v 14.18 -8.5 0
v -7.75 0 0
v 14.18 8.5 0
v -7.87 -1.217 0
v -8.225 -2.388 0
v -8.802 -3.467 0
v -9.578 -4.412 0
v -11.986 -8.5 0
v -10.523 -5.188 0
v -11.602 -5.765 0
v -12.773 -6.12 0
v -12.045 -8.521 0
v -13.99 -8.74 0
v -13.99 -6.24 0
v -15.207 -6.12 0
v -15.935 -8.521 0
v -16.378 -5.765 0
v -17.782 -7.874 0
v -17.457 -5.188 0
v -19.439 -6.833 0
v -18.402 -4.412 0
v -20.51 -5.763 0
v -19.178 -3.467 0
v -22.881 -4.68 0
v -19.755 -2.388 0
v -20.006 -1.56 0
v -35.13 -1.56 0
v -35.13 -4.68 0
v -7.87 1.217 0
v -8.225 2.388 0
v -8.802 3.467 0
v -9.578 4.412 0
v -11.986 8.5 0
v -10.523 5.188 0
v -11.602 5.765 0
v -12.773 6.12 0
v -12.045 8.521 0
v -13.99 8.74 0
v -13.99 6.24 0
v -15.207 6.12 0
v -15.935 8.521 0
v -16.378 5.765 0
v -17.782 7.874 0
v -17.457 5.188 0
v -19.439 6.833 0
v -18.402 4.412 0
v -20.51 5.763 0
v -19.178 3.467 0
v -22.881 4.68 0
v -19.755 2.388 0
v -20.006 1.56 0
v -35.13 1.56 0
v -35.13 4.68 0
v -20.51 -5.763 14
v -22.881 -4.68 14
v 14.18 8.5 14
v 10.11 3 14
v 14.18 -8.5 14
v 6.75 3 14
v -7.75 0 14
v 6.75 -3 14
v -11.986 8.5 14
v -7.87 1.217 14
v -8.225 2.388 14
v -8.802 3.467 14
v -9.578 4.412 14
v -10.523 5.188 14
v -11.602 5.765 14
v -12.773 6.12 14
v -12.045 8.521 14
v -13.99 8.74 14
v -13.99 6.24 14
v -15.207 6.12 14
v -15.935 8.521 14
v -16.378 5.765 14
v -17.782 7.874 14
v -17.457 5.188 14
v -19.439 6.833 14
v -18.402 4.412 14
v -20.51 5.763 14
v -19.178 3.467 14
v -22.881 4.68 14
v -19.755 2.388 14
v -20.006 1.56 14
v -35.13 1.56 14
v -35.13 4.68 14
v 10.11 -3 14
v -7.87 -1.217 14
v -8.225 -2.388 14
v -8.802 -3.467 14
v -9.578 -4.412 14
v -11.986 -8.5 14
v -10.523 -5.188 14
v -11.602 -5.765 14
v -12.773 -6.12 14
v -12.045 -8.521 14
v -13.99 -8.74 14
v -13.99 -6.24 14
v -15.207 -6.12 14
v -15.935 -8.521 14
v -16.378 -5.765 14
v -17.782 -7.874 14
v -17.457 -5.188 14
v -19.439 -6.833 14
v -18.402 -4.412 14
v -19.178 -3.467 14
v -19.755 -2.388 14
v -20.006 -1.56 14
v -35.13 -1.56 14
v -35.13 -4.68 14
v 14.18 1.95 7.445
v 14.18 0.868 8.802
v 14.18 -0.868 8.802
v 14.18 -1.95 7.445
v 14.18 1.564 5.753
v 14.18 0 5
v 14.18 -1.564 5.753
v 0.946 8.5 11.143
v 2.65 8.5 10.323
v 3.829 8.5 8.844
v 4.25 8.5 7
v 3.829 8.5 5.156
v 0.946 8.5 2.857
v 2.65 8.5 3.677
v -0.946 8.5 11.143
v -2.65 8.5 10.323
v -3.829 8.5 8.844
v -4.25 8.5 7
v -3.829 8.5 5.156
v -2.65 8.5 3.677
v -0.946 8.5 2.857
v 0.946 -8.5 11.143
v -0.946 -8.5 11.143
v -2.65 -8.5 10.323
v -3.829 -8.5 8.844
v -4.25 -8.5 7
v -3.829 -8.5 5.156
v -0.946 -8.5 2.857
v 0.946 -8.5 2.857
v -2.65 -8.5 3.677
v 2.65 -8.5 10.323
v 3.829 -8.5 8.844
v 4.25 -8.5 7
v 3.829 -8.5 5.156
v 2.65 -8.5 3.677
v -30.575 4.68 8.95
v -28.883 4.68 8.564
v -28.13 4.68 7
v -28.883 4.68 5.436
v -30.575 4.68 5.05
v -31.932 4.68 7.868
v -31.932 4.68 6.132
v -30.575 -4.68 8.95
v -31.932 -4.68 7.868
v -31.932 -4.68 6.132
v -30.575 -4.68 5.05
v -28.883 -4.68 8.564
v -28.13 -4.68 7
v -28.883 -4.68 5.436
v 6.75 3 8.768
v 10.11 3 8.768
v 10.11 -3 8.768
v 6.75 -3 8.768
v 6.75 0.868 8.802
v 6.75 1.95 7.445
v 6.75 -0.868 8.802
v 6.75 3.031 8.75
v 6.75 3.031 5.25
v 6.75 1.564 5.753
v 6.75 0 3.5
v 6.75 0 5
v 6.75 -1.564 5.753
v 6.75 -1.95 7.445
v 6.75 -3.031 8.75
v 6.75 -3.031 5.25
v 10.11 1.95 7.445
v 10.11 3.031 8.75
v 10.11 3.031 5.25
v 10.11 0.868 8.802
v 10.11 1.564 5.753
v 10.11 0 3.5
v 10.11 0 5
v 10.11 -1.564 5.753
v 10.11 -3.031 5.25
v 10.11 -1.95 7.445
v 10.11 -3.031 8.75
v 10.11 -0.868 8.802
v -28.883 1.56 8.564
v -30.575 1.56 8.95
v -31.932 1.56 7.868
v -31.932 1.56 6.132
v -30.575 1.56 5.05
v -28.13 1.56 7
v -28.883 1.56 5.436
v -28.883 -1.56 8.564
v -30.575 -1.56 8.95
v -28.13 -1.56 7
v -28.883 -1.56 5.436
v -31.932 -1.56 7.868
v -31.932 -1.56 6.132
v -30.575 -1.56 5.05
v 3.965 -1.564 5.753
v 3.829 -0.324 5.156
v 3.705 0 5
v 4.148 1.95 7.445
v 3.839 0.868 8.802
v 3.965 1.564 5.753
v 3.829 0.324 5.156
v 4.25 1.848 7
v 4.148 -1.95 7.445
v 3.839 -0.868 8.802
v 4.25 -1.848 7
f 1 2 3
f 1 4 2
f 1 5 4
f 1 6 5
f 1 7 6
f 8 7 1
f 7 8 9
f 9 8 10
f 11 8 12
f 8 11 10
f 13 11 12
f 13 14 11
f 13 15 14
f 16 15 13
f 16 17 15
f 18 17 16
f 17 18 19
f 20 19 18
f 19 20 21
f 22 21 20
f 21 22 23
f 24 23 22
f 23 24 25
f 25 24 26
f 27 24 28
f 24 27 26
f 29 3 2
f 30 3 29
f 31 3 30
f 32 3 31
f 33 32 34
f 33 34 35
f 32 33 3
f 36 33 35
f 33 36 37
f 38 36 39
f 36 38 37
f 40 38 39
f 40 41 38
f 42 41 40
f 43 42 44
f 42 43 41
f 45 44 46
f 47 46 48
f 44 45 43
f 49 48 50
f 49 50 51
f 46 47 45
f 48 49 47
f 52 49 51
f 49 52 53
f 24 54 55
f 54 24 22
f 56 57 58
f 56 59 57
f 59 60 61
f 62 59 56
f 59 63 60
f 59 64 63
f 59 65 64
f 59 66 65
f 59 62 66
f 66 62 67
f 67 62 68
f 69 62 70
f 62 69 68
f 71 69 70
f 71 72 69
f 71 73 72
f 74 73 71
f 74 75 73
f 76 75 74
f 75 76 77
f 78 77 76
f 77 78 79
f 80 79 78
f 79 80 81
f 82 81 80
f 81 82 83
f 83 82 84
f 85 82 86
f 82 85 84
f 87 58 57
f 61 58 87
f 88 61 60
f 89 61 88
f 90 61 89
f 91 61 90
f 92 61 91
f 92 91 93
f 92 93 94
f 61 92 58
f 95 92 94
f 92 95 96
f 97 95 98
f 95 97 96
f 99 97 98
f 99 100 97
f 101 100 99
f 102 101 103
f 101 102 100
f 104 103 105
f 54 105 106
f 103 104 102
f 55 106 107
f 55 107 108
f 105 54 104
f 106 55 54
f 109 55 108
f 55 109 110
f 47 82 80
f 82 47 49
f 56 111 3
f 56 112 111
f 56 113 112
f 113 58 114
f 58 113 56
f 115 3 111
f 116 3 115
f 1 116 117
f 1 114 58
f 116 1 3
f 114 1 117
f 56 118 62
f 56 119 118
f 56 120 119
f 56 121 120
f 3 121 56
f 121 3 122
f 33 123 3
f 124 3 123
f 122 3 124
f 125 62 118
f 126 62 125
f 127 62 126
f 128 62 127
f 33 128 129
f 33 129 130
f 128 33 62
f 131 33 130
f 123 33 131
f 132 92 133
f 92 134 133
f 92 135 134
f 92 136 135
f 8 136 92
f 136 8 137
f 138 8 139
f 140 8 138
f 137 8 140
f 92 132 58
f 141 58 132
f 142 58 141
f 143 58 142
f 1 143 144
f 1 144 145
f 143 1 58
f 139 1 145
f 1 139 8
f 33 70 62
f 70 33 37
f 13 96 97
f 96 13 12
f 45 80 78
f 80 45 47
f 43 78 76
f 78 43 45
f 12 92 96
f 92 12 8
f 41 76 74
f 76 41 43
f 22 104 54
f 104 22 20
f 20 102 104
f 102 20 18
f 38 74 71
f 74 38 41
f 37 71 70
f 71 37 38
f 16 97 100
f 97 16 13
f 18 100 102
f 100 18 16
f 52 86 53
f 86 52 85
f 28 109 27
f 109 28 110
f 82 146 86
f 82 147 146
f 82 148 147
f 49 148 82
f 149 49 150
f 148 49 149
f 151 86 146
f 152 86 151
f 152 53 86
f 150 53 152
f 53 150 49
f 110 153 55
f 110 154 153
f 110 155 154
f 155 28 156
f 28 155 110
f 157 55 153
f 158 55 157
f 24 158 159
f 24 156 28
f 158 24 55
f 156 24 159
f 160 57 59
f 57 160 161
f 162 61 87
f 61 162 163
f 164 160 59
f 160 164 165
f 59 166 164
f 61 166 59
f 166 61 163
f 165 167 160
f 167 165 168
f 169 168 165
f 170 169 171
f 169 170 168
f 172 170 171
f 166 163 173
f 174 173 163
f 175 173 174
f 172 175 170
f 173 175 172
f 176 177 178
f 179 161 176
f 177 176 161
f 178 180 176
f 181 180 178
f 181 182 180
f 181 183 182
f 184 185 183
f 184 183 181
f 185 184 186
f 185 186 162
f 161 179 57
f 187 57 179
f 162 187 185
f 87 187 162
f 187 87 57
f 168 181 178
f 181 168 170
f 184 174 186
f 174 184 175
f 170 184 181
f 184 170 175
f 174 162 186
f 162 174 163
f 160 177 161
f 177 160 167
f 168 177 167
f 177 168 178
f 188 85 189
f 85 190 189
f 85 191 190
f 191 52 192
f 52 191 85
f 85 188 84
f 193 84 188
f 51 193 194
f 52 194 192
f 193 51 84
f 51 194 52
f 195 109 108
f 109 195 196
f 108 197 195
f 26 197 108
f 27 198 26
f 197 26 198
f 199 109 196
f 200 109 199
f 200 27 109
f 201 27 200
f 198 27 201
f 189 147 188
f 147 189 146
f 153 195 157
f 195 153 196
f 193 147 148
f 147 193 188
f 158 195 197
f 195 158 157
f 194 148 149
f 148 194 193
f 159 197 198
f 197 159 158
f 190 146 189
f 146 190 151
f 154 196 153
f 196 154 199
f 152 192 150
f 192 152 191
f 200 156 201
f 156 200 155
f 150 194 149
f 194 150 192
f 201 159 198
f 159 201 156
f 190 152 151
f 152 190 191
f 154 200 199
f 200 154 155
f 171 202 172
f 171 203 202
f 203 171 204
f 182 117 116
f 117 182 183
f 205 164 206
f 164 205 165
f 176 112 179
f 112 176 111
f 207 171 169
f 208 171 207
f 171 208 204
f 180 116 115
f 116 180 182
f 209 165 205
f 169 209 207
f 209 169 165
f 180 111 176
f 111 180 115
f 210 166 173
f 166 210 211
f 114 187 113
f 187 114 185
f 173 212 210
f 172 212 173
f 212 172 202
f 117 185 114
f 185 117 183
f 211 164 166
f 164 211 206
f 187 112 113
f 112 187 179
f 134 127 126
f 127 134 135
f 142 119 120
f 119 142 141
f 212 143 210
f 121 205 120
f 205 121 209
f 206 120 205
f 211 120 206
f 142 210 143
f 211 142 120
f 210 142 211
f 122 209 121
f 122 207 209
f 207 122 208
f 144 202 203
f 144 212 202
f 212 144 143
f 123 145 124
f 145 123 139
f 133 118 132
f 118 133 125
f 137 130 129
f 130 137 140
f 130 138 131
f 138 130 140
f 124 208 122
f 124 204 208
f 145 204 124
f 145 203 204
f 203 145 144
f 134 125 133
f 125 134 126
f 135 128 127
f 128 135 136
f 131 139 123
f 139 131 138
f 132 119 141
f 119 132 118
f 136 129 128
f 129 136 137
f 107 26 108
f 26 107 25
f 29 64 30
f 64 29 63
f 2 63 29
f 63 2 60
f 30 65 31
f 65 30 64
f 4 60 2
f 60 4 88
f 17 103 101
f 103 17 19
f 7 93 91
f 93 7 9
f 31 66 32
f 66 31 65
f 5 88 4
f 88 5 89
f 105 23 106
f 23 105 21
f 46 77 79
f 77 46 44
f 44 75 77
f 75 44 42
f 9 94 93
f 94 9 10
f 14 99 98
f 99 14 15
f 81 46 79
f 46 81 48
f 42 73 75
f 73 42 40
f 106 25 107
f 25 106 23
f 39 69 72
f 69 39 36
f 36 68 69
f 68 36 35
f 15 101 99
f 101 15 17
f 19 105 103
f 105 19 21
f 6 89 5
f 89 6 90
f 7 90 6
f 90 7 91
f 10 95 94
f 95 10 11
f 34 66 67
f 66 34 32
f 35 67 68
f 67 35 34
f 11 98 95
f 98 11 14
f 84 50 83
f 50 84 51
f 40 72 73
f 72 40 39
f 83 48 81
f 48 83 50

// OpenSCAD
// TODO - what else can be done to reduce cost, while keeping it easy to print?
// v1 Shapeways price difference when reducing material with existing settings (Nylon $5.65 vs $6.62)
// v2 Shapeways price difference when reducing material with existing settings (Nylon $4.89 vs $6.11)

//CUSTOMIZER VARIABLES

/* [Basic_Parameters] */

// larger or smaller will need a bit of additional design work
// Diode diameter, in mm
diode_diameter = 12.0; // [2.0:0.1:50]

// Support rod diameter, in mm
rod_diameter = 8.0;  // [3:0.1:40]

// Bolt diameter, in mm
bolt_diameter = 3.0;    // [2:0.1:20]

// Nut diameter, in mm
nut_diameter = 6.0;  // [3:0.1:40]

// Nut thickness, in mm
nut_thickness = 2.8;  // [2:0.1:30]

/* [Extra_Features_for_Strength] */

// rod clamp width margin, in mm
clamp_margin = 5;   // [3:30]

// margin to support the rod in xy, in mm
rod_margin = 7; // [3:30]

// margin to support the rod in z, in mm
depth_margin = 6;   // [3:30]

// margin to support the diode and clamp, in mm
diode_margin = 5;   // [3:30]

// this saves material, but increases stress
// Match body to diode length or not, boolean
full_size_block = 1;   // [0:false, 1:true]

// this saves material, but increases stress, fails FDM printing
// Make the clamp arms smaller - won't print FDM, boolean
small_arms = 0;   // [0:false, 1:true]

//CUSTOMIZER VARIABLES END

// how much extra space to allow in nut trap
nut_space_factor = 1.2;

// Sanity checks
if( diode_diameter<=0 || rod_diameter <= 0
    || bolt_diameter <= 0 || nut_diameter <= 0 || nut_thickness <= 0)
{
    echo("<B>Error: Missing important parameters</B>");
}

if(nut_diameter<=bolt_diameter)
{
    echo("<B>Error: Nut size too small for bolt</B>");
}


max_gap_thickness = 6;  // don't let the arms get too thick

// z depth
main_depth= max( 10, max(rod_diameter,bolt_diameter,nut_diameter)+depth_margin );

nut_trap_len = nut_thickness*nut_space_factor;

// our object, translated to be flat on xy plane for easy STL generation
translate([0,0,main_depth/2])
    optics_clamp();

module optics_clamp(){

    bolt_rad= (bolt_diameter+1)/2;  // this should be sorta loose
    rod_rad= (rod_diameter+0.5)/2;  // should be almost tight
    diode_rad= (diode_diameter * 1.04)/2;  // don't increment this one as much - it needs to be a tight fit
    holder_rad = diode_rad + diode_margin/2;

    main_width= (rod_diameter+rod_margin)+clamp_margin+nut_trap_len;
    clamp_height= diode_diameter+diode_margin;

    main_height_without= max((nut_diameter+clamp_margin), bolt_diameter+rod_margin );
    main_height_with= max(clamp_height,main_height_without);
    main_height= (full_size_block != 0) ? main_height_with : main_height_without;

    rod_x= 0;
    diode_x= -(diode_rad + rod_rad + max(rod_margin,diode_margin)/2);
    nut_x= rod_x + rod_rad + clamp_margin/2;
    nut_y = 0;

    diode_clamp_depth_without= bolt_diameter+clamp_margin;
    diode_clamp_depth_with= max( bolt_diameter+clamp_margin, main_depth);
    diode_clamp_depth= (small_arms == 0) ? diode_clamp_depth_with : diode_clamp_depth_without;

    diode_clamp_space= min( max_gap_thickness, max(1, diode_rad / 2 ) );
    diode_clamp_length= min( 10, max( 7, diode_rad ) ) + max( bolt_diameter, clamp_margin ) + diode_margin/2;
    diode_clamp_thickness= min( diode_clamp_space+2*max_gap_thickness, max( diode_clamp_space + 3, diode_rad * 1.5 ) );
    diode_clamp_x= diode_x - diode_rad - (diode_clamp_length/2) + 0.1;  // fudge for small diodes

    diode_nut_x= diode_clamp_x - (diode_clamp_length/2) + (clamp_margin/2) + bolt_rad;

    diode_length= main_depth + 20;
    rod_length= main_height + 20;

    difference() {

        union() {
          // the main block
          translate([(clamp_margin)/2,0,0])
            cube([main_width,main_height,main_depth],center = true);

          // diode holder
          translate([diode_x,0,-main_depth/2])
            cylinder(main_depth,holder_rad,holder_rad);
          translate([diode_x/2,0,0])
            cube([-diode_x,main_height,main_depth],center = true);

          if (small_arms == 0) {
              // hacky fillet long
              translate([0,0,-main_depth/2])
                linear_extrude(main_depth)
                    polygon( [ [diode_x, -holder_rad], [diode_x, holder_rad], [diode_nut_x-bolt_diameter, 0] ] );
              // hacky fillet short
              translate([0,0,-main_depth/2])
                linear_extrude(main_depth)
                    polygon( [ [diode_x, -main_height/2], [diode_x, main_height/2], [(diode_x+diode_nut_x)/2, 0] ] );
          }

          // diode clamp arms
         translate([diode_clamp_x,0,0])
             cube([diode_clamp_length+1,diode_clamp_thickness,diode_clamp_depth],center = true);
        }

    // diode clamp gap
      translate([diode_clamp_x,0,0])
        cube([diode_clamp_length+2,diode_clamp_space,main_depth+5],center = true);

    // diode clamp bolt hole
      translate([diode_nut_x,rod_length/2,0])
        rotate([90,0,0])
          cylinder(rod_length,bolt_rad,bolt_rad);

    // rod clamp nut and bolt hole
      translate([nut_x,nut_y,0])
        rotate([0,0,90])
          nuttrap();
      translate([rod_x,nut_y,0])
        rotate([0,90,0])
          cylinder(main_width,bolt_rad,bolt_rad);

    // the support rod
    #color("green")
      translate([rod_x,rod_length/2,0])
        rotate([90,0,0])
          cylinder(rod_length,rod_rad,rod_rad);

    // the diode
    #color("magenta")
      translate([diode_x,0,-diode_length/2])
        rotate([0,0,0])
          cylinder(diode_length,diode_rad,diode_rad,$fn=32);    // needs to be fairly smooth
    }
}

module hexagon(height,radius) 
{
  linear_extrude(height)
    circle(radius,$fn=6);
}

module nuttrap(){
  translate([0,-nut_trap_len/2,main_depth/2])
    cube([nut_diameter,nut_trap_len,main_depth],center =true);
  rotate([90,360/12,0]) // so point is down, nut trapped by straight sides
    hexagon(nut_trap_len,(nut_diameter+1)/2);
}
